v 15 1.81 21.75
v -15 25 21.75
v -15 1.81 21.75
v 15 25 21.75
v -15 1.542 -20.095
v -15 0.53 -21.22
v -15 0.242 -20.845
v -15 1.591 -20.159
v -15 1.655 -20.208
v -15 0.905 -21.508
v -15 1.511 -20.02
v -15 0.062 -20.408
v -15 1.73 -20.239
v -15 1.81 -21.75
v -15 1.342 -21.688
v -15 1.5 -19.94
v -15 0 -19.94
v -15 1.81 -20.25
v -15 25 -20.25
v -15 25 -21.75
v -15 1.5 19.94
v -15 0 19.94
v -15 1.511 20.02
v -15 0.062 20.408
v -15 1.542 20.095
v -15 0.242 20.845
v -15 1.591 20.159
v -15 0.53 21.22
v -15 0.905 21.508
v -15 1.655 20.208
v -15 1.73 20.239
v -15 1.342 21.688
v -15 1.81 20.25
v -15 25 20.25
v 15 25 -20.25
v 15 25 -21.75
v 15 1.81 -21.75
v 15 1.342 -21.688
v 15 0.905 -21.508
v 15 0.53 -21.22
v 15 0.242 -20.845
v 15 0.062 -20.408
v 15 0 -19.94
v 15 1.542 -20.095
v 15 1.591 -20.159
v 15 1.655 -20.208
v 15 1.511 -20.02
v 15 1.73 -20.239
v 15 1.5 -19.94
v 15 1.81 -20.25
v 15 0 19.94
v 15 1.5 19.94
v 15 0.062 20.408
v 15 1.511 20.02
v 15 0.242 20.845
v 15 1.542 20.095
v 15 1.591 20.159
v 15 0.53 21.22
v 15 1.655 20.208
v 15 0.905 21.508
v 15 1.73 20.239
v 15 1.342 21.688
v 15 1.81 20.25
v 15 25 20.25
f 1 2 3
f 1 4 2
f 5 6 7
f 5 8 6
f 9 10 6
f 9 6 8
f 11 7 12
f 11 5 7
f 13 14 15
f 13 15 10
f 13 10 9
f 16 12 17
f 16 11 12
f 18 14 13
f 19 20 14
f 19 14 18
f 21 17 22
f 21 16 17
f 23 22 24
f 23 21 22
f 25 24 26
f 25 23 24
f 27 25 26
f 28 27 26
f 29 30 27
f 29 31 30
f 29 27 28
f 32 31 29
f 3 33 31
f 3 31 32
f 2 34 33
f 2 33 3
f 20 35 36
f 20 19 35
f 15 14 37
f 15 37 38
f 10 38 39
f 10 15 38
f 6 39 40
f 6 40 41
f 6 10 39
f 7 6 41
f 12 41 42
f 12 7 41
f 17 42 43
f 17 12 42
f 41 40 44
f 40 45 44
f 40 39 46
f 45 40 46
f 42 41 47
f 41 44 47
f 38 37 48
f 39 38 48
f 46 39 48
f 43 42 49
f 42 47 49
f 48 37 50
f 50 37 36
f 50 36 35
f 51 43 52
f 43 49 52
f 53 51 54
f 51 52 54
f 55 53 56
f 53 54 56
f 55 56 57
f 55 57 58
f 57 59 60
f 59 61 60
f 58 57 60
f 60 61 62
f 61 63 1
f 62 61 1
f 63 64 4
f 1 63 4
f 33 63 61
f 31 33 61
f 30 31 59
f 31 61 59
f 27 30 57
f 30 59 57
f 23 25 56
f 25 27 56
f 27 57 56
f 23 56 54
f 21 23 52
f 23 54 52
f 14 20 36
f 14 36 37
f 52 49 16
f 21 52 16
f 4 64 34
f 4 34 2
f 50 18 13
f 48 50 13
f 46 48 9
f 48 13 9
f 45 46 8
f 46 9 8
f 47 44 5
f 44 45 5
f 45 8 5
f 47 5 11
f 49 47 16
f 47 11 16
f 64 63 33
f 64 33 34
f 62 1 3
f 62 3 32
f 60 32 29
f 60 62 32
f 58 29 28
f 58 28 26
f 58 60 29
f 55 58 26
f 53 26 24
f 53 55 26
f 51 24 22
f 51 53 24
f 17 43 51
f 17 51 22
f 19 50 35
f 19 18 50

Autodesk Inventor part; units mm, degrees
ref_plane "YZ Plane" through (0, 0, 0) normal (1, 0, 0) x (0, 1, 0)
ref_plane "XZ Plane" through (0, 0, 0) normal (0, 1, 0) x (-1, 0, 0)
ref_plane "XY Plane" through (0, 0, 0) normal (0, 0, 1) x (1, 0, 0)
sketch "Sketch1" plane through (0, 0, 0) normal (0, 1, 0) x (-1, 0, 0)
  line L0 (-15, 20.25) -> (15, 20.25)
  line L1 (15, 20.25) -> (15, -20.25)
  line L2 (15, -20.25) -> (-15, -20.25)
  line L3 (-15, -20.25) -> (-15, 20.25)
  line L4 (-15, 20.25) -> (15, -20.25) construction
  line L5 (15, 20.25) -> (-15, -20.25) construction
  point P0 (0, 0)
  dimension "d0" = 30
  dimension "d1" = 40.5
extrude "Plate1" add sketch "Sketch1" along normal blind 1.5
sketch "Sketch2" plane through (-15, 0, -21.75) normal (0, 0, 1) x (1, 0, 0)
  line L0 (30, 0) -> (0, 0)
  line L1 (0, 0) -> (0, 25)
  line L2 (0, 25) -> (30, 25)
  line L3 (30, 25) -> (30, 0)
edge flange "Flange1" height 25 angle 90 thickness 1.5 bend radius 0.31 thickness toward (0, 0, 1) relief tear relief width 1.5 relief depth 0.75 corner gap 0.31 corner form 0 edges at (0, 1.5, -20.25) (0, 1.5, 20.25) wall of the first edge with corners at (15, 0, -21.75) (-15, 0, -21.75) (-15, 25, -21.75) (15, 25, -21.75)
bend "Bend1"
corner "Corner1"
equation "\"d2\" = Thickness"
equation "\"d3\" = BendReliefWidth"
equation "\"d4\" = BendReliefDepth"
equation "\"d5\" = MinimumRemnant"
equation "\"d6\" = TransitionRadius"
equation "\"d9\" = BendRadius"
equation "\"d10\" = CornerReliefSize"
equation "\"d11\" = GapSize"
equation "\"d12\" = JacobiRadiusSize"
equation "\"BendReliefWidth\" = Thickness"
equation "\"BendReliefDepth\" = 0.5 * Thickness"
equation "\"CornerReliefSize\" = 4 * Thickness"
equation "\"MinimumRemnant\" = 2 * Thickness"
equation "\"TransitionRadius\" = BendRadius"
equation "\"JacobiRadiusSize\" = BendRadius"
equation "\"GapSize\" = Thickness"
equation "\"Thickness\" = 1.5"
equation "\"BendRadius\" = 0.31"
properties part number "chanhui" material "Aluminum 6061-AHC"
